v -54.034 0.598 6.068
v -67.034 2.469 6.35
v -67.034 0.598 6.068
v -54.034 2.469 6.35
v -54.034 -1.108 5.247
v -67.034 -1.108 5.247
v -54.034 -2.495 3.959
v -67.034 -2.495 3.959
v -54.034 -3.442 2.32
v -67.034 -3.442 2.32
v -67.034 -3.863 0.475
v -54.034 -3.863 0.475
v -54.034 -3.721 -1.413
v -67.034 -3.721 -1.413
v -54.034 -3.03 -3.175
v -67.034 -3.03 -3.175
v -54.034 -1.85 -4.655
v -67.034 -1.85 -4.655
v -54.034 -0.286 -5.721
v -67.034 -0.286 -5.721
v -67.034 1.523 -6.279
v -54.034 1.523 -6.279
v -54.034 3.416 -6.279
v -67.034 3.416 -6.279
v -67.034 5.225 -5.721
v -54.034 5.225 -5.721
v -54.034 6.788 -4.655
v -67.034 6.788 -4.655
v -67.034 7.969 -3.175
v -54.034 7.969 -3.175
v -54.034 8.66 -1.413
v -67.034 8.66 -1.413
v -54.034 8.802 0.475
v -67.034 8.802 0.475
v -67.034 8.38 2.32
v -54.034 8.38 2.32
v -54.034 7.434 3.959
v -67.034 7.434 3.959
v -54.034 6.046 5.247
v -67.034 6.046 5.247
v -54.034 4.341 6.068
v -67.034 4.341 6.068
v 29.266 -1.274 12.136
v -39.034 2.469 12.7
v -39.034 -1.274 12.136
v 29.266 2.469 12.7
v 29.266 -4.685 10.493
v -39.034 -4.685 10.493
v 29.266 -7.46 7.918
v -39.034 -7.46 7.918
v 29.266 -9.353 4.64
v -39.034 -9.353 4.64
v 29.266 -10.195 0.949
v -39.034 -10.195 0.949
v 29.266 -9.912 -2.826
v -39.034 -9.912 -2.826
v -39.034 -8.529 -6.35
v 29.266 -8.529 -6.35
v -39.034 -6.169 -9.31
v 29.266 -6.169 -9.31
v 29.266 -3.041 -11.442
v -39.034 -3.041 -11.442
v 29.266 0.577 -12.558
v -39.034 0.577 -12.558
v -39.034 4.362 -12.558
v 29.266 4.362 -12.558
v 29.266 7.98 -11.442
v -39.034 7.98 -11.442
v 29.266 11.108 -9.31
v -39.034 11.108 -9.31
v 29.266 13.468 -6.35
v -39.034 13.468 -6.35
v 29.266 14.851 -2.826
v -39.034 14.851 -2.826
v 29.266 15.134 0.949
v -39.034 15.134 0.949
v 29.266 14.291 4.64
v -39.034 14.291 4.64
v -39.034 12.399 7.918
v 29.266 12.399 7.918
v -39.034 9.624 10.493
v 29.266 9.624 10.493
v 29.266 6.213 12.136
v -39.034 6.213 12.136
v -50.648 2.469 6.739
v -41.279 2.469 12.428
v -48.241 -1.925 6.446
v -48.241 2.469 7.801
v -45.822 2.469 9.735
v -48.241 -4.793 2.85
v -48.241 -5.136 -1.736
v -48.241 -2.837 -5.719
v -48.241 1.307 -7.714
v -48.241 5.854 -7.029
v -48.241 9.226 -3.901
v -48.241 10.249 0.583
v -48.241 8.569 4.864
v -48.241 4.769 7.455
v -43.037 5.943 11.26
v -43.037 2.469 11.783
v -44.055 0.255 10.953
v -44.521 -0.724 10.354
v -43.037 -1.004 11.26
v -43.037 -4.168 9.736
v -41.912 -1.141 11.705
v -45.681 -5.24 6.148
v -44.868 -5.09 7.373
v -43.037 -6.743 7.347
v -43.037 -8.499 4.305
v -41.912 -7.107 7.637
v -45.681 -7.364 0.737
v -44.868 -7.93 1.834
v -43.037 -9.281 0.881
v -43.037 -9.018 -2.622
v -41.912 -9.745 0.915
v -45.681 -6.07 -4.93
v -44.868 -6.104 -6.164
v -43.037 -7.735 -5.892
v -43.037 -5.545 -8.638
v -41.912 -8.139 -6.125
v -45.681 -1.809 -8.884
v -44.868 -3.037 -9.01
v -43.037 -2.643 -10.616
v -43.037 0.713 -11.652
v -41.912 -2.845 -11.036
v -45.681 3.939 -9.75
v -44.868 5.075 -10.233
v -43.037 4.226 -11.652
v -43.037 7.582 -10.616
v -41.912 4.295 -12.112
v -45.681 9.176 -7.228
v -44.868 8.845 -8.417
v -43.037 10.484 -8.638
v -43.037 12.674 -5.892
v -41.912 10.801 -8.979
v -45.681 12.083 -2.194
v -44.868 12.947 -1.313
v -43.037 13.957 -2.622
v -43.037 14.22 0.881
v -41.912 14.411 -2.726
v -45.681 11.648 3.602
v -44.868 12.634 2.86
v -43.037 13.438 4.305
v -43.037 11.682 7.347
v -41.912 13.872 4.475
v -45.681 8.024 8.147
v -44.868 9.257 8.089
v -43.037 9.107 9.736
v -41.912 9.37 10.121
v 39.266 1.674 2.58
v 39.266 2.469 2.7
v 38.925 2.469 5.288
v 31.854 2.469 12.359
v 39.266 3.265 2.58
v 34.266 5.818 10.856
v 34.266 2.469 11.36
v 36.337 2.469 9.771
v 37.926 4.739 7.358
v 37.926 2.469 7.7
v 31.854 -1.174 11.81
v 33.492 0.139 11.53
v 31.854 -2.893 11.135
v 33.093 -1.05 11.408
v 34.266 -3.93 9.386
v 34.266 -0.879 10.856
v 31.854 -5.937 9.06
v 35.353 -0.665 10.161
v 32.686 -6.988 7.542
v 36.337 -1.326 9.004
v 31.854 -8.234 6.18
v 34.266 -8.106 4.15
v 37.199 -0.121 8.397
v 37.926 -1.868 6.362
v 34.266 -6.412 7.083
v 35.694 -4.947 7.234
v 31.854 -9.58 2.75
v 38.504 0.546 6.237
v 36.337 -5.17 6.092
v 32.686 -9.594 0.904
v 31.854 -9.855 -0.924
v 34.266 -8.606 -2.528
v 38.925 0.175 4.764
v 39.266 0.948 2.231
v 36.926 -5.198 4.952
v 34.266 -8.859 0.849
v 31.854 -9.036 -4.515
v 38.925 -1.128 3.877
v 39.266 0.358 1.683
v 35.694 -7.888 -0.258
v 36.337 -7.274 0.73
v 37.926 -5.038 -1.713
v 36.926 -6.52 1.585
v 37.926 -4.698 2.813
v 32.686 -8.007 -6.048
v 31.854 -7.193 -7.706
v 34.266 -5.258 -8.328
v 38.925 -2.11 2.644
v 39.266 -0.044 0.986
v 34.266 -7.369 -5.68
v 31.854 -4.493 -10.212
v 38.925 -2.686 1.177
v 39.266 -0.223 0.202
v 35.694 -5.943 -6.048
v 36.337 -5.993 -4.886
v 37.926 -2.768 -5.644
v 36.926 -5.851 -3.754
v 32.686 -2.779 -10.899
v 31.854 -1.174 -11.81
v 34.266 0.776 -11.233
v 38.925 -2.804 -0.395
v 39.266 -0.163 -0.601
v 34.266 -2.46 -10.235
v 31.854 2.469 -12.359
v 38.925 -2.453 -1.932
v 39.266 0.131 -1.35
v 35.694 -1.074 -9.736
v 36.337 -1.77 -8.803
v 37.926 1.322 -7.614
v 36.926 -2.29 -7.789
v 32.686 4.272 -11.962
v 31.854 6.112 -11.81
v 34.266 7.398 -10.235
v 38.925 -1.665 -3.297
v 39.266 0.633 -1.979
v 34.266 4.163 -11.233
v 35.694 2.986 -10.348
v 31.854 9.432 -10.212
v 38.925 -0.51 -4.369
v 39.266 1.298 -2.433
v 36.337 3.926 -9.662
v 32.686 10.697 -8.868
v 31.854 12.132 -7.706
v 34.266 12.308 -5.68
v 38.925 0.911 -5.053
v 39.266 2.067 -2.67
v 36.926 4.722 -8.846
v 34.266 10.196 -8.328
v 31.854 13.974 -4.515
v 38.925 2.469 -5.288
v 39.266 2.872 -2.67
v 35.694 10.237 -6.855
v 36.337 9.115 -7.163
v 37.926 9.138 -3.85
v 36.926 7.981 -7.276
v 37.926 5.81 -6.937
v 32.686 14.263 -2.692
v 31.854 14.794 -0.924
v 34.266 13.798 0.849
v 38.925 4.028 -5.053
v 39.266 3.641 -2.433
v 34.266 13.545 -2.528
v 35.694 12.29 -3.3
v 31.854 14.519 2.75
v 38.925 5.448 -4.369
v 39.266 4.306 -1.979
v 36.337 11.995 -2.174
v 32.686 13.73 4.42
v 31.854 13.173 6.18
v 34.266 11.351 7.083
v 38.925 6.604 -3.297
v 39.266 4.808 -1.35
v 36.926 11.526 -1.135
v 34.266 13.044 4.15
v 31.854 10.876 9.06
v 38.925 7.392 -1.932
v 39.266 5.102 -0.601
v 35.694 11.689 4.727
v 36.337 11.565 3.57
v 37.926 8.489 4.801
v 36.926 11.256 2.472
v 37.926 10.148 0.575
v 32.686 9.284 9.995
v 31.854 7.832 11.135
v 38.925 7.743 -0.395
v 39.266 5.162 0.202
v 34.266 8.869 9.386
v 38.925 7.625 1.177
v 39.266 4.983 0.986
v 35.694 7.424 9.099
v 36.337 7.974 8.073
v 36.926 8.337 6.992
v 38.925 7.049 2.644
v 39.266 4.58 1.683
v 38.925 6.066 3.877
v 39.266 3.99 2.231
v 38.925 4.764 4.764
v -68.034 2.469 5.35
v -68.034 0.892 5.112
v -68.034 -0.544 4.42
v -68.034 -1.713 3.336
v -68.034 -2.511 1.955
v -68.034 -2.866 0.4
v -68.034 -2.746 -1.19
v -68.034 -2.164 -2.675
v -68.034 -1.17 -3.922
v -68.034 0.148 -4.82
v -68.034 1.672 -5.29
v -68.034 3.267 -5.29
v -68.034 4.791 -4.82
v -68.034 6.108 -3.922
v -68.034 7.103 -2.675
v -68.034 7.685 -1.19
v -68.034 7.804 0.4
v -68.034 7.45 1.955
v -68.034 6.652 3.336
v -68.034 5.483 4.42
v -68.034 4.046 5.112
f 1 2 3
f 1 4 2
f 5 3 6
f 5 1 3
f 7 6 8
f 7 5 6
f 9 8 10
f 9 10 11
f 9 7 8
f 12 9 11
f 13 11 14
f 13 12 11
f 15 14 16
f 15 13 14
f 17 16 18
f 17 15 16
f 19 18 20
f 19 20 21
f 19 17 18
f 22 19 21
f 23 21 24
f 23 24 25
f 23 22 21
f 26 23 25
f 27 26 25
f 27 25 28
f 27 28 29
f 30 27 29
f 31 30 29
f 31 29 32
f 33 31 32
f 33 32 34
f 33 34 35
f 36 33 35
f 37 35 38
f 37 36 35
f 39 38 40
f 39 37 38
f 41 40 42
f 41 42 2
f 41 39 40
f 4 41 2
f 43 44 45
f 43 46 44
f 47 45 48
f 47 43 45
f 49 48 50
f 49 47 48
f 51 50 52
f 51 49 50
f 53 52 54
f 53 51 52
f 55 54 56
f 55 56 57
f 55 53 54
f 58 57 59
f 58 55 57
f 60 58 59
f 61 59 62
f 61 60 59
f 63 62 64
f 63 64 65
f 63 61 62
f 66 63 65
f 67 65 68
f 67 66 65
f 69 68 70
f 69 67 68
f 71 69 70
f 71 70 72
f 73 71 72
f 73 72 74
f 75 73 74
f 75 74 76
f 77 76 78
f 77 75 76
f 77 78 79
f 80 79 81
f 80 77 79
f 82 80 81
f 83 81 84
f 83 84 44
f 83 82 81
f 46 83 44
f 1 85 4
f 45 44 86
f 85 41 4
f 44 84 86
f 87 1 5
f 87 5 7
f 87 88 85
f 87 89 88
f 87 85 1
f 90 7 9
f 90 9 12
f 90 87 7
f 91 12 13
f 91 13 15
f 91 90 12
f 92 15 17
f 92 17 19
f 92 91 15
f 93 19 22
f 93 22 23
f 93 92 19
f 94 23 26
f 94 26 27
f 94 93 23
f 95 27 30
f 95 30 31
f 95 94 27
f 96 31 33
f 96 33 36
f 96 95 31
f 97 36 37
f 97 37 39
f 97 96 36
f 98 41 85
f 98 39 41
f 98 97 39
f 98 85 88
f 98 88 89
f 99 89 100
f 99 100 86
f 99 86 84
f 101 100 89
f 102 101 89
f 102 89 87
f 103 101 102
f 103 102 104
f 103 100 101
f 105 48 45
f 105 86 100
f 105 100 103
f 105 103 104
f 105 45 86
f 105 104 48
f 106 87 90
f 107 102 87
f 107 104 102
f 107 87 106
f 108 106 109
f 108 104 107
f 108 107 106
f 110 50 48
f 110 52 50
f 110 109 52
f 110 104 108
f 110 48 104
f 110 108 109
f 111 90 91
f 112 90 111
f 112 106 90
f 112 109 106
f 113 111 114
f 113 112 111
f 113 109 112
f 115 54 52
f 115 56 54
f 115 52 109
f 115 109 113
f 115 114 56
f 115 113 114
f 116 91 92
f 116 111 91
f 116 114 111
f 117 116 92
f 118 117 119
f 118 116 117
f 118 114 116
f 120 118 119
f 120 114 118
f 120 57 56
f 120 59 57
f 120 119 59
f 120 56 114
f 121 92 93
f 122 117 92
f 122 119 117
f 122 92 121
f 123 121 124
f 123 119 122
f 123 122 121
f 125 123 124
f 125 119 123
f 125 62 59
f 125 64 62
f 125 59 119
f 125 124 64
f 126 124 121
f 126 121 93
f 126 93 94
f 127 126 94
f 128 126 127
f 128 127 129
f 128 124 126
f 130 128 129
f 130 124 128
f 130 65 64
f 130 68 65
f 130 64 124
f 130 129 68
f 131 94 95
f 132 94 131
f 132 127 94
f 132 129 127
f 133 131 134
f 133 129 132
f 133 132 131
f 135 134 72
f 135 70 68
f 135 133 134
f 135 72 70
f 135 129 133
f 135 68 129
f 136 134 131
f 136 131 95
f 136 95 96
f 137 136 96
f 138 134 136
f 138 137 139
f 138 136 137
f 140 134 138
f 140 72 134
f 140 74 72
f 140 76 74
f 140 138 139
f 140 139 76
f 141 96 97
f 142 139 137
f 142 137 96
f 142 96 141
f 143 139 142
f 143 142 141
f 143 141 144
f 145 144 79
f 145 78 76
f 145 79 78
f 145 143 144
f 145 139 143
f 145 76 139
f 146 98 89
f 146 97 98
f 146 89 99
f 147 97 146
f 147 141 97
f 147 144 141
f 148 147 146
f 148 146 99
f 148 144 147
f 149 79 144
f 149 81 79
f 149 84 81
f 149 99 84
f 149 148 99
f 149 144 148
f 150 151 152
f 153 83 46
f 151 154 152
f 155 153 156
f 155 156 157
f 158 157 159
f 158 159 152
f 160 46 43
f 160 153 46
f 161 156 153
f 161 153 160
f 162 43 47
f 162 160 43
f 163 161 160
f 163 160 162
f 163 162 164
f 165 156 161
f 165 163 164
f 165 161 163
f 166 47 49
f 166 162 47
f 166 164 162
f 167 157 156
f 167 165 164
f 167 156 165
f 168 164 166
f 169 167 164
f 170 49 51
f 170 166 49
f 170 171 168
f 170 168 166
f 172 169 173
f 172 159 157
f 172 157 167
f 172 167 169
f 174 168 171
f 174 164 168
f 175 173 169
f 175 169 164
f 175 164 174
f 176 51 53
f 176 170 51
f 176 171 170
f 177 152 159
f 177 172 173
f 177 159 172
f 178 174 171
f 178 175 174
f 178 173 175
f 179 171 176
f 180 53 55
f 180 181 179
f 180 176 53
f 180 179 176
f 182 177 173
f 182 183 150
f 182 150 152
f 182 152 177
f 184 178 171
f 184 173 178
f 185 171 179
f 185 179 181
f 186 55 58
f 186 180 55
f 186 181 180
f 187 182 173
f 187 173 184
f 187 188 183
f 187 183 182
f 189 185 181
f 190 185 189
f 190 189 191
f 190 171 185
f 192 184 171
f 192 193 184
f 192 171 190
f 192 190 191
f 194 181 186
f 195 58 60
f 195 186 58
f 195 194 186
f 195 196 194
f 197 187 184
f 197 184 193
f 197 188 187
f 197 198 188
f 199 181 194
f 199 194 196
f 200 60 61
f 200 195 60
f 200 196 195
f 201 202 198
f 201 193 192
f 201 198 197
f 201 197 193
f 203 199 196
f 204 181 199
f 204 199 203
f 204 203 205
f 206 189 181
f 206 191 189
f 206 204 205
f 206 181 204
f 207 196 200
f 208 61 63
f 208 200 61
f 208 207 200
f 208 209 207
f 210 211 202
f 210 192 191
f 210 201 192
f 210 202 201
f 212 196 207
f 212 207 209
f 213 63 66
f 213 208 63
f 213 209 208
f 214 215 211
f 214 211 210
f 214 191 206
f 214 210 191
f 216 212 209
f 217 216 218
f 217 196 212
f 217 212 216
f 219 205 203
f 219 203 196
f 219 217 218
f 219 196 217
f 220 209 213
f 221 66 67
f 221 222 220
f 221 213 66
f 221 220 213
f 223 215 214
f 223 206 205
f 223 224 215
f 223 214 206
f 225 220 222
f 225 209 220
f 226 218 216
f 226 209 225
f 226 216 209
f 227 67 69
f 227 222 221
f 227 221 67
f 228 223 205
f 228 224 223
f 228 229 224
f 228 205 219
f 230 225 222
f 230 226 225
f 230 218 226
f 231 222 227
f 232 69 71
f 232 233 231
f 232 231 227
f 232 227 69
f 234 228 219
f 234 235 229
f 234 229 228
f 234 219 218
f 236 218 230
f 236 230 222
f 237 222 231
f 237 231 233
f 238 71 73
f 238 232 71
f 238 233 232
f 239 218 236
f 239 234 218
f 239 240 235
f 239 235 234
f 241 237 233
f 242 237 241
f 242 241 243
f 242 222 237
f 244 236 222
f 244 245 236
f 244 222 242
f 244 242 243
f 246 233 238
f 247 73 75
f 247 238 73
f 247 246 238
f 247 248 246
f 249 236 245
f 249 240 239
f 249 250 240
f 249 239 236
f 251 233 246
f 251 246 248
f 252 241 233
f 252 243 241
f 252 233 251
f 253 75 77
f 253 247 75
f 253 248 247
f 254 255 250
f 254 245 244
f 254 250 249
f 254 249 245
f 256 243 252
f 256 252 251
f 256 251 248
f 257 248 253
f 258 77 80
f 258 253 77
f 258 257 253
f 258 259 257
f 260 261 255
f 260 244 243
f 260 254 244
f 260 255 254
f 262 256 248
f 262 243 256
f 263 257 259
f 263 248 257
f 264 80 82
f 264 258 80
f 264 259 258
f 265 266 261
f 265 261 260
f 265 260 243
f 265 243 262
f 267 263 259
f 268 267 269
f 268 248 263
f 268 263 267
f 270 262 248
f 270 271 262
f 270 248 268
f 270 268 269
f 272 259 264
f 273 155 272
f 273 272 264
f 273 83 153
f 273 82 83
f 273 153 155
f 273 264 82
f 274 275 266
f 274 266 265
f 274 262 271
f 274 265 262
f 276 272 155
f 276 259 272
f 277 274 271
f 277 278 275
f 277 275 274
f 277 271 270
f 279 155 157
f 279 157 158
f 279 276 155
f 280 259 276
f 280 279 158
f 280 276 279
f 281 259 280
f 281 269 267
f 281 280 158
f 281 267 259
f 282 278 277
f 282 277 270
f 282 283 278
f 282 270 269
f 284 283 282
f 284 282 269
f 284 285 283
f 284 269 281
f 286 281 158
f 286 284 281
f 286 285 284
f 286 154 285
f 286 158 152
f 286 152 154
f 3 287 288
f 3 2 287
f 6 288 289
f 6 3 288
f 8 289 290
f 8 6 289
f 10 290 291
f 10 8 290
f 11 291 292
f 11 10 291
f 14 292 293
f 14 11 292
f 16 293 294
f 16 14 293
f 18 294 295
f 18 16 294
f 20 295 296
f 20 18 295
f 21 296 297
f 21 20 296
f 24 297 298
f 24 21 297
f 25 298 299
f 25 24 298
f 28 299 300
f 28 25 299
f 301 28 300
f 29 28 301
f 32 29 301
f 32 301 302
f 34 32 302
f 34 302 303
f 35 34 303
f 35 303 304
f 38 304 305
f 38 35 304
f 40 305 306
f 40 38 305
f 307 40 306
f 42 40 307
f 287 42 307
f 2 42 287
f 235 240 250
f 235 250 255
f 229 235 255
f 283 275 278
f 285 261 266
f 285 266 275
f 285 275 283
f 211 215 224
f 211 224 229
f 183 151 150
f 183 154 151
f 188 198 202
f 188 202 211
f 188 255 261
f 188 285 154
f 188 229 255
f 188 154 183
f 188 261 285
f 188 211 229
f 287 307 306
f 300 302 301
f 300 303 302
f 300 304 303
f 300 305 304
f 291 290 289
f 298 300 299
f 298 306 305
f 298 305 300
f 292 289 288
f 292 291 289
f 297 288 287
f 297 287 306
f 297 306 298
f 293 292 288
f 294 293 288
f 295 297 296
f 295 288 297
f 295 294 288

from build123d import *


with BuildPart() as part:
    # revolution body → Revolve1 (revolve)
    with BuildSketch(Plane.XY, mode=Mode.PRIVATE) as revolve1_sk:
        with BuildLine():
            Line((-67.034317062, 8.819371739), (-54.034317062, 8.819371739))
            add(Edge.make_bspline(
                [(-54.034317062, 8.819371739), (-45.639917935, 8.716149455), (-46.425076057, 15.031715968), (-39.034317062, 15.169371739)],
                knots=[0, 0, 0, 0, 1, 1, 1, 1], degree=3))
            Line((-39.034317062, 15.169371739), (29.265682938, 15.169371739))
            ThreePointArc((29.265682938, 15.169371739), (36.33675075, 12.24043955), (39.265682938, 5.169371739))
            Line((39.265682938, 5.169371739), (39.265682938, 2.469371739))
            Line((39.265682938, 2.469371739), (-68.034317062, 2.469371739))
            Line((-68.034317062, 2.469371739), (-68.034317062, 7.819371739))
            Line((-68.034317062, 7.819371739), (-67.034317062, 8.819371739))
        make_face()
    revolve(revolve1_sk.sketch.rotate(Axis((-68.034317062, 2.469371739, 0), (1, 0, 0)), 90), axis=Axis((-68.034317062, 2.469371739, 0), (1, 0, 0)))


solid = part.part
